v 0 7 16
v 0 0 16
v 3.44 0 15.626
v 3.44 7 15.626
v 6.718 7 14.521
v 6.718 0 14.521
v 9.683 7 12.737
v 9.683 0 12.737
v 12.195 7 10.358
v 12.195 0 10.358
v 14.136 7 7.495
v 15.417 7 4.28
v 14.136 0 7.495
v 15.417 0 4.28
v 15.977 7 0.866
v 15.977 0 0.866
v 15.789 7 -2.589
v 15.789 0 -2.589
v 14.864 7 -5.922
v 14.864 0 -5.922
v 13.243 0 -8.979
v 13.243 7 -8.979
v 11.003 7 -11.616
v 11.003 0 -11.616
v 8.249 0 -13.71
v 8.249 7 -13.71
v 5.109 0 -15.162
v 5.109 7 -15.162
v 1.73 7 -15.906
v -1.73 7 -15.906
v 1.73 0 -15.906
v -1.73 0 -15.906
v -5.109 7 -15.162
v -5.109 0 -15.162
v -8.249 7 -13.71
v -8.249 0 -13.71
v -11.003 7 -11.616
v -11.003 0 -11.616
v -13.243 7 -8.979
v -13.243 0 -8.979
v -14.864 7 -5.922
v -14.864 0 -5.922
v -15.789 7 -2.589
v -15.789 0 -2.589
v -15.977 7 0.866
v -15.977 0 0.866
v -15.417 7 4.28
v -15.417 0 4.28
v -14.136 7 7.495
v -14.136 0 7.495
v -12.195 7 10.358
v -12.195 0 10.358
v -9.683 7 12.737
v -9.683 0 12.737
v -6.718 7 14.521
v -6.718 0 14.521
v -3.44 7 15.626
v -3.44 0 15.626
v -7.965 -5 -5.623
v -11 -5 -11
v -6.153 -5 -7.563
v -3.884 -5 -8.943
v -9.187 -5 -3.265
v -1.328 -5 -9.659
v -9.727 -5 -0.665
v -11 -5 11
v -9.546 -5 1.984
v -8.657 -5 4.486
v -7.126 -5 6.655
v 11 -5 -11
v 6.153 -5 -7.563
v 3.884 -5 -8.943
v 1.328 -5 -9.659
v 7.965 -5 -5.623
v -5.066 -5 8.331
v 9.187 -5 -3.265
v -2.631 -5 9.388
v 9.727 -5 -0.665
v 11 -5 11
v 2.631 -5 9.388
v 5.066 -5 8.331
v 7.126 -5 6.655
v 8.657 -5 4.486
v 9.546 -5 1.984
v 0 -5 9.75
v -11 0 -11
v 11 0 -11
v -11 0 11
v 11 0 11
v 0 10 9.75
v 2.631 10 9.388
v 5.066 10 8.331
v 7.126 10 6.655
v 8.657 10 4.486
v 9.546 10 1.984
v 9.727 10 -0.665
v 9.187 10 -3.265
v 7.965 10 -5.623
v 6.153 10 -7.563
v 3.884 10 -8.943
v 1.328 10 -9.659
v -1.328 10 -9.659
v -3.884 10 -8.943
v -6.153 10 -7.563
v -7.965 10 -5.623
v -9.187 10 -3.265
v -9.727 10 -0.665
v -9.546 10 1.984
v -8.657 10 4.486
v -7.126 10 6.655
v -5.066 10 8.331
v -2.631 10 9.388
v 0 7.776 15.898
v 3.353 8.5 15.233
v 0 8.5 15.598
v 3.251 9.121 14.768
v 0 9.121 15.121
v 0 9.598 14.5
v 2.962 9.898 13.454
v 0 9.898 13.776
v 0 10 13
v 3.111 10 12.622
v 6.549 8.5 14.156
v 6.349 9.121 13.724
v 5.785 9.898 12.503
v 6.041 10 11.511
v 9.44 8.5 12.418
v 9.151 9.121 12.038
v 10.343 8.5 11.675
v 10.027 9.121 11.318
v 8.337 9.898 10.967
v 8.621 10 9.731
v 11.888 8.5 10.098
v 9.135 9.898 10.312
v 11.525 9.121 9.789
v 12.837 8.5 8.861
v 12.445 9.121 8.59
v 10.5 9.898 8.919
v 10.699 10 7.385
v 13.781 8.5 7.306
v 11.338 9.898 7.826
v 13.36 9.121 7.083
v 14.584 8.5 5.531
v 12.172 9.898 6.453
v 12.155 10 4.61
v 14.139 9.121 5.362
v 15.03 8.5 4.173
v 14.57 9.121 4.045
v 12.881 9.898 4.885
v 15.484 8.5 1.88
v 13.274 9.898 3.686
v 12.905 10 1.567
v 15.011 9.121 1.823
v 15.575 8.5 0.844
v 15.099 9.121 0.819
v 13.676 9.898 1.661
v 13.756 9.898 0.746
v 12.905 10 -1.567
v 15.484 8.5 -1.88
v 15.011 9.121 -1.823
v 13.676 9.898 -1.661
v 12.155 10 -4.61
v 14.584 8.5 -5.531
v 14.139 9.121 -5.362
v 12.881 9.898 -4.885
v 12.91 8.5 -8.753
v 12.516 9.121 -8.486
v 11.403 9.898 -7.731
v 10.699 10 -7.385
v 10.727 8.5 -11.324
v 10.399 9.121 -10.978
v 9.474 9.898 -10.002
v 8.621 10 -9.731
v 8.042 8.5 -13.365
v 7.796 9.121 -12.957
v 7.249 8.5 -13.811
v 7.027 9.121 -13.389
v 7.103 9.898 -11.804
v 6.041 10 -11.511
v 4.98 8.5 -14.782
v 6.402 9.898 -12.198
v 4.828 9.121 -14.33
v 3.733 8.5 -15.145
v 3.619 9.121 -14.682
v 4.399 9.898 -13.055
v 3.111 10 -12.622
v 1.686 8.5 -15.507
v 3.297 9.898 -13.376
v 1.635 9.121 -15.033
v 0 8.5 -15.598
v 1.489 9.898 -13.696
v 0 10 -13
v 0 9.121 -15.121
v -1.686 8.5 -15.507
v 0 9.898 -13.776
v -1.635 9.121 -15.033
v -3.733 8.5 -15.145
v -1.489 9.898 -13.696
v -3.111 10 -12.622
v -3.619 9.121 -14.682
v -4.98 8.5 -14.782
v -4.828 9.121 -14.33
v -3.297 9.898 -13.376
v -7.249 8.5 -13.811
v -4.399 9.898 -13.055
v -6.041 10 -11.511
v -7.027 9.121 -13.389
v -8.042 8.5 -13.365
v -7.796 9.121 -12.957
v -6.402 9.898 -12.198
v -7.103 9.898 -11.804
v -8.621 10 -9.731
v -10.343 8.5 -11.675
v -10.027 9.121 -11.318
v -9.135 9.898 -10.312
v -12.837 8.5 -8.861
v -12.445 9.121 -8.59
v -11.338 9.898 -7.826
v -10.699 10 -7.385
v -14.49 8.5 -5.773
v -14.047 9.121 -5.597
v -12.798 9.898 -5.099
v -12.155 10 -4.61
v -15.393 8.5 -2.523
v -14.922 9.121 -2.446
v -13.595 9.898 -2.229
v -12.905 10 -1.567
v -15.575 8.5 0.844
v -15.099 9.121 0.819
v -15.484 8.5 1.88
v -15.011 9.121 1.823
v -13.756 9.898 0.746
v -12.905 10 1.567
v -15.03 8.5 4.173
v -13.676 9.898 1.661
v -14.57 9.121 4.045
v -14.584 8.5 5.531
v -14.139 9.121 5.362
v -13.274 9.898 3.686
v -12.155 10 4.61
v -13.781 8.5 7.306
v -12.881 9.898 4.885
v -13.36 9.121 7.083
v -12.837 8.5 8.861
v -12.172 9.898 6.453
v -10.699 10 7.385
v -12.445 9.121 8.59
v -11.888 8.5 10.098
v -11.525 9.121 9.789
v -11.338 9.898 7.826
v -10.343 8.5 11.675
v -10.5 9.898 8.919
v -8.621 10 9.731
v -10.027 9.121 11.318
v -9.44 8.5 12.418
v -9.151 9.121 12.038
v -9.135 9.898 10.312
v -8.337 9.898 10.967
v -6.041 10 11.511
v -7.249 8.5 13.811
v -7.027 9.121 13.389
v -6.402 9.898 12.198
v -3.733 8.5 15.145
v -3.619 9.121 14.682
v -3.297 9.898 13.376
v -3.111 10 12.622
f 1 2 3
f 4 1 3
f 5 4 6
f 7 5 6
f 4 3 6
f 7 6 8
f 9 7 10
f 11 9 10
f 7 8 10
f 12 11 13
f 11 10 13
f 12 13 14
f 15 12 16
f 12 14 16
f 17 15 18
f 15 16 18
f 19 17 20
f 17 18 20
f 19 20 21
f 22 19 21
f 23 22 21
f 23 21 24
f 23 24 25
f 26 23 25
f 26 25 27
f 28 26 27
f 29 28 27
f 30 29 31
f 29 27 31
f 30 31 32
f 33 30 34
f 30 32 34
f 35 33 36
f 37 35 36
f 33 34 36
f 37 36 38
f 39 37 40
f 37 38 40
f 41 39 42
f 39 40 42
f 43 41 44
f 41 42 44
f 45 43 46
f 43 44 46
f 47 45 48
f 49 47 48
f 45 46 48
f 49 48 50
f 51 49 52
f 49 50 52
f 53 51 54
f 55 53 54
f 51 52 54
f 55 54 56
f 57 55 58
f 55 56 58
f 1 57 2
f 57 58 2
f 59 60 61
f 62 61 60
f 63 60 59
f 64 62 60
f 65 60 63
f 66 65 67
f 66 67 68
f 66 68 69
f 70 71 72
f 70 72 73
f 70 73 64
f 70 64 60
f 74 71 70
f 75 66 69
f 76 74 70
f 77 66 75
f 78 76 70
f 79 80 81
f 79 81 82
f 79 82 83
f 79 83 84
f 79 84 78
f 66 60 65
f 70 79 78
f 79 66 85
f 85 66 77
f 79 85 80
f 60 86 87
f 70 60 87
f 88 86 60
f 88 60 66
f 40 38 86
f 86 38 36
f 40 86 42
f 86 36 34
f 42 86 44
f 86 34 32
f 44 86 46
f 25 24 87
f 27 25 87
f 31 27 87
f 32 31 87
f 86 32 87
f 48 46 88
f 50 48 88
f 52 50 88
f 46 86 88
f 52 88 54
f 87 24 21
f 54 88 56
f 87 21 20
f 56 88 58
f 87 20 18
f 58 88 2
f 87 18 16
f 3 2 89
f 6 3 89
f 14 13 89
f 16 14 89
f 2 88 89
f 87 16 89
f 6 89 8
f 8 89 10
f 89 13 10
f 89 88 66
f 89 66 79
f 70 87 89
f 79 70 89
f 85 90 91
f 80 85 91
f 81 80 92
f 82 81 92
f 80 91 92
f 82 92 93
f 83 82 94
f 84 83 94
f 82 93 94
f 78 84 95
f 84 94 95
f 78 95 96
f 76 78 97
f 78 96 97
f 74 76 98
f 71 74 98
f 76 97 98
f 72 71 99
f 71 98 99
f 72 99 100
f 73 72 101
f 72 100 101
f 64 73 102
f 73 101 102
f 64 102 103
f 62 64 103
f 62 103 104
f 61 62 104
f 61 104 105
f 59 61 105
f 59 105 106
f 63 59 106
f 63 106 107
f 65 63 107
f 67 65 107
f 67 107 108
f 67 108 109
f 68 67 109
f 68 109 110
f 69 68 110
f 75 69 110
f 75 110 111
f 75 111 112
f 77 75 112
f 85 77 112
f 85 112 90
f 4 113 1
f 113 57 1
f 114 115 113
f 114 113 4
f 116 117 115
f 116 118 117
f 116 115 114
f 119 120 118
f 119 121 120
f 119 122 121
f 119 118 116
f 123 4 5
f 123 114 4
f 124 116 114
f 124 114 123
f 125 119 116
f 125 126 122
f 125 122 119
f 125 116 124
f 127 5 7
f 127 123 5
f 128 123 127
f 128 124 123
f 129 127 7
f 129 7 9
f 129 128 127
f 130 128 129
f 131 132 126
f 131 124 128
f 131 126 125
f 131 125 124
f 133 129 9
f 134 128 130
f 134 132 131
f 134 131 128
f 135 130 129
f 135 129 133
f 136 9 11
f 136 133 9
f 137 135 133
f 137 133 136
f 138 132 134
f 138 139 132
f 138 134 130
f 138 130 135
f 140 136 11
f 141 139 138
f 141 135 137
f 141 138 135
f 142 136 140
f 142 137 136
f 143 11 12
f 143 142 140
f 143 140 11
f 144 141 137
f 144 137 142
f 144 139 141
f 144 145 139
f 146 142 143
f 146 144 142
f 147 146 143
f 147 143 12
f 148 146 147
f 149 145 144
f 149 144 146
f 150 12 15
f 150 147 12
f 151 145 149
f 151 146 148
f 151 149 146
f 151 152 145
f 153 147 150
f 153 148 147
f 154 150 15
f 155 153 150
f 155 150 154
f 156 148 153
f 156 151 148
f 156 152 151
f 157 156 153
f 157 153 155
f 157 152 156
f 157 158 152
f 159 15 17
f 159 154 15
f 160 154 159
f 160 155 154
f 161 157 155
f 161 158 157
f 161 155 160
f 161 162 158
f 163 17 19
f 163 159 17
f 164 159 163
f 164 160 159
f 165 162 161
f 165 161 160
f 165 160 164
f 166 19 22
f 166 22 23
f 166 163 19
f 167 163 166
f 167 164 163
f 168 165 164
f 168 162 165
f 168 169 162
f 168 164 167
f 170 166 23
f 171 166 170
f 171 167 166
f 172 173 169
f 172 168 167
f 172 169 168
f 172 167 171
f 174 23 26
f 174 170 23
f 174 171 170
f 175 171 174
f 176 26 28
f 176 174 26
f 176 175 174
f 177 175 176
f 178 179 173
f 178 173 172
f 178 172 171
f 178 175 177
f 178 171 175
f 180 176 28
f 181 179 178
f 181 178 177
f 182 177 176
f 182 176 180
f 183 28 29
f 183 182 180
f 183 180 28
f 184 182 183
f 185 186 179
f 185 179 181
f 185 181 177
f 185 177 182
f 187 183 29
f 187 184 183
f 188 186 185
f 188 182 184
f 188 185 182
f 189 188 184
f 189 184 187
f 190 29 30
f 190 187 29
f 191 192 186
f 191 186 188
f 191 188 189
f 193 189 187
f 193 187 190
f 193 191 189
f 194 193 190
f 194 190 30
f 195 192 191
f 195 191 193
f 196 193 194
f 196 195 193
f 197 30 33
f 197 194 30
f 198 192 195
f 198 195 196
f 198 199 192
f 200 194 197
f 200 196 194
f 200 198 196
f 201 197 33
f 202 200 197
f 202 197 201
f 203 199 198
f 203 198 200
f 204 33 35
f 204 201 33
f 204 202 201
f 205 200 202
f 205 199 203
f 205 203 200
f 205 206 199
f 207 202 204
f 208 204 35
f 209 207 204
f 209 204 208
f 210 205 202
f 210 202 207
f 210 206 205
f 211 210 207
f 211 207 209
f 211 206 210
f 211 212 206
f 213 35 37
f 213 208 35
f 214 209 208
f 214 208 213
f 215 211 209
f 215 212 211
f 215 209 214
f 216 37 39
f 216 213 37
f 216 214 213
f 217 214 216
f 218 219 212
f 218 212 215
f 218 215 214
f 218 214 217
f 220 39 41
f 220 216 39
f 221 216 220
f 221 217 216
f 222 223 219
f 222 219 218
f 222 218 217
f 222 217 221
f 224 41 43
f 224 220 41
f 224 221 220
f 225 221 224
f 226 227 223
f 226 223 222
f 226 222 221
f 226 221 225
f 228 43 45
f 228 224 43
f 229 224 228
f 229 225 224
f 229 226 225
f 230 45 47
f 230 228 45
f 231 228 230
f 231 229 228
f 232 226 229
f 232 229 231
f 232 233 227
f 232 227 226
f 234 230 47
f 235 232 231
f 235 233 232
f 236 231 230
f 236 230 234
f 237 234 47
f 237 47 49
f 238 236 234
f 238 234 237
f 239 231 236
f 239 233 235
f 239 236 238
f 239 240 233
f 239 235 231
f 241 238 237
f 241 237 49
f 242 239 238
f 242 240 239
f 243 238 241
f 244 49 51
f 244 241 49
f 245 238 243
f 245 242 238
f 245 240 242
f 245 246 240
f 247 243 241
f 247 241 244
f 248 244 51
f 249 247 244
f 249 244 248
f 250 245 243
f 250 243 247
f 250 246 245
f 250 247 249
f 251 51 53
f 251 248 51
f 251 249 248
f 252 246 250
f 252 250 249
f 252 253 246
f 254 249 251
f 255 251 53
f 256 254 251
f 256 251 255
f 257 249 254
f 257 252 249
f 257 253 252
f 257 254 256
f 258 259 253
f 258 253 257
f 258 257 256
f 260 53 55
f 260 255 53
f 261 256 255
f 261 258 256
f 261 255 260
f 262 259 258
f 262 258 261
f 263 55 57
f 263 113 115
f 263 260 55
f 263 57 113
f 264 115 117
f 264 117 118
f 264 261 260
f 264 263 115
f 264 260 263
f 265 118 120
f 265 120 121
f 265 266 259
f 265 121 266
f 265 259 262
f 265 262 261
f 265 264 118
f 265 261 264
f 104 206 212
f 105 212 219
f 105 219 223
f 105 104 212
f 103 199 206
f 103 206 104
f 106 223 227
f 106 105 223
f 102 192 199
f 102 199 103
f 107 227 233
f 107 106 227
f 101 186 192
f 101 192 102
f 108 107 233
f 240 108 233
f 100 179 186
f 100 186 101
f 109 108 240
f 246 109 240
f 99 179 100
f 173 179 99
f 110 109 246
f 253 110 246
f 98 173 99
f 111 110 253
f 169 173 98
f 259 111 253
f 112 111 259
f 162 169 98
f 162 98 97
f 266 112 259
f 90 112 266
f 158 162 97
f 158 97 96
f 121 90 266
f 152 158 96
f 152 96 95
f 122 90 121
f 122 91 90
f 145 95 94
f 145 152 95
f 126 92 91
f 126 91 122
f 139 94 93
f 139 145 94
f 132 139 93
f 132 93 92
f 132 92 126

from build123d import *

# Parameters (mm, degrees)
SKETCH1_R           = 16
BOSS_EXTRUDE1_DEPTH = 10
SKETCH2_W           = 22
SKETCH2_H           = 22
BOSS_EXTRUDE2_DEPTH = 5
SKETCH3_R           = 9.75
CUT_EXTRUDE1_DEPTH  = 28.147743921
FILLET1_R           = 3


with BuildPart() as part:
    # Sketch1 → Boss-Extrude1 (new body)
    with BuildSketch(Plane(origin=(0, 0, 0), x_dir=(1, 0, 0), z_dir=(0, 1, 0))):
        with Locations(Location((0, 0, 0), (0, 0, 270))):
            Circle(SKETCH1_R)
    extrude(amount=BOSS_EXTRUDE1_DEPTH)

    # Sketch2 → Boss-Extrude2 (add)
    with BuildSketch(Plane.XZ):
        Rectangle(SKETCH2_W, SKETCH2_H)
    extrude(amount=BOSS_EXTRUDE2_DEPTH)

    # Sketch3 → Cut-Extrude1 (cut, through all)
    with BuildSketch(Plane(origin=(0, 10, 0), x_dir=(1, 0, 0), z_dir=(0, 1, 0))):
        with Locations(Location((0, 0, 0), (0, 0, 270))):
            Circle(SKETCH3_R)
    extrude(amount=-CUT_EXTRUDE1_DEPTH, mode=Mode.SUBTRACT)

    # Fillet1
    fillet1_edges = [part.edges().sort_by_distance(p)[0] for p in [
        (0, 10, -16),
    ]]
    fillet(fillet1_edges, radius=FILLET1_R)


solid = part.part
